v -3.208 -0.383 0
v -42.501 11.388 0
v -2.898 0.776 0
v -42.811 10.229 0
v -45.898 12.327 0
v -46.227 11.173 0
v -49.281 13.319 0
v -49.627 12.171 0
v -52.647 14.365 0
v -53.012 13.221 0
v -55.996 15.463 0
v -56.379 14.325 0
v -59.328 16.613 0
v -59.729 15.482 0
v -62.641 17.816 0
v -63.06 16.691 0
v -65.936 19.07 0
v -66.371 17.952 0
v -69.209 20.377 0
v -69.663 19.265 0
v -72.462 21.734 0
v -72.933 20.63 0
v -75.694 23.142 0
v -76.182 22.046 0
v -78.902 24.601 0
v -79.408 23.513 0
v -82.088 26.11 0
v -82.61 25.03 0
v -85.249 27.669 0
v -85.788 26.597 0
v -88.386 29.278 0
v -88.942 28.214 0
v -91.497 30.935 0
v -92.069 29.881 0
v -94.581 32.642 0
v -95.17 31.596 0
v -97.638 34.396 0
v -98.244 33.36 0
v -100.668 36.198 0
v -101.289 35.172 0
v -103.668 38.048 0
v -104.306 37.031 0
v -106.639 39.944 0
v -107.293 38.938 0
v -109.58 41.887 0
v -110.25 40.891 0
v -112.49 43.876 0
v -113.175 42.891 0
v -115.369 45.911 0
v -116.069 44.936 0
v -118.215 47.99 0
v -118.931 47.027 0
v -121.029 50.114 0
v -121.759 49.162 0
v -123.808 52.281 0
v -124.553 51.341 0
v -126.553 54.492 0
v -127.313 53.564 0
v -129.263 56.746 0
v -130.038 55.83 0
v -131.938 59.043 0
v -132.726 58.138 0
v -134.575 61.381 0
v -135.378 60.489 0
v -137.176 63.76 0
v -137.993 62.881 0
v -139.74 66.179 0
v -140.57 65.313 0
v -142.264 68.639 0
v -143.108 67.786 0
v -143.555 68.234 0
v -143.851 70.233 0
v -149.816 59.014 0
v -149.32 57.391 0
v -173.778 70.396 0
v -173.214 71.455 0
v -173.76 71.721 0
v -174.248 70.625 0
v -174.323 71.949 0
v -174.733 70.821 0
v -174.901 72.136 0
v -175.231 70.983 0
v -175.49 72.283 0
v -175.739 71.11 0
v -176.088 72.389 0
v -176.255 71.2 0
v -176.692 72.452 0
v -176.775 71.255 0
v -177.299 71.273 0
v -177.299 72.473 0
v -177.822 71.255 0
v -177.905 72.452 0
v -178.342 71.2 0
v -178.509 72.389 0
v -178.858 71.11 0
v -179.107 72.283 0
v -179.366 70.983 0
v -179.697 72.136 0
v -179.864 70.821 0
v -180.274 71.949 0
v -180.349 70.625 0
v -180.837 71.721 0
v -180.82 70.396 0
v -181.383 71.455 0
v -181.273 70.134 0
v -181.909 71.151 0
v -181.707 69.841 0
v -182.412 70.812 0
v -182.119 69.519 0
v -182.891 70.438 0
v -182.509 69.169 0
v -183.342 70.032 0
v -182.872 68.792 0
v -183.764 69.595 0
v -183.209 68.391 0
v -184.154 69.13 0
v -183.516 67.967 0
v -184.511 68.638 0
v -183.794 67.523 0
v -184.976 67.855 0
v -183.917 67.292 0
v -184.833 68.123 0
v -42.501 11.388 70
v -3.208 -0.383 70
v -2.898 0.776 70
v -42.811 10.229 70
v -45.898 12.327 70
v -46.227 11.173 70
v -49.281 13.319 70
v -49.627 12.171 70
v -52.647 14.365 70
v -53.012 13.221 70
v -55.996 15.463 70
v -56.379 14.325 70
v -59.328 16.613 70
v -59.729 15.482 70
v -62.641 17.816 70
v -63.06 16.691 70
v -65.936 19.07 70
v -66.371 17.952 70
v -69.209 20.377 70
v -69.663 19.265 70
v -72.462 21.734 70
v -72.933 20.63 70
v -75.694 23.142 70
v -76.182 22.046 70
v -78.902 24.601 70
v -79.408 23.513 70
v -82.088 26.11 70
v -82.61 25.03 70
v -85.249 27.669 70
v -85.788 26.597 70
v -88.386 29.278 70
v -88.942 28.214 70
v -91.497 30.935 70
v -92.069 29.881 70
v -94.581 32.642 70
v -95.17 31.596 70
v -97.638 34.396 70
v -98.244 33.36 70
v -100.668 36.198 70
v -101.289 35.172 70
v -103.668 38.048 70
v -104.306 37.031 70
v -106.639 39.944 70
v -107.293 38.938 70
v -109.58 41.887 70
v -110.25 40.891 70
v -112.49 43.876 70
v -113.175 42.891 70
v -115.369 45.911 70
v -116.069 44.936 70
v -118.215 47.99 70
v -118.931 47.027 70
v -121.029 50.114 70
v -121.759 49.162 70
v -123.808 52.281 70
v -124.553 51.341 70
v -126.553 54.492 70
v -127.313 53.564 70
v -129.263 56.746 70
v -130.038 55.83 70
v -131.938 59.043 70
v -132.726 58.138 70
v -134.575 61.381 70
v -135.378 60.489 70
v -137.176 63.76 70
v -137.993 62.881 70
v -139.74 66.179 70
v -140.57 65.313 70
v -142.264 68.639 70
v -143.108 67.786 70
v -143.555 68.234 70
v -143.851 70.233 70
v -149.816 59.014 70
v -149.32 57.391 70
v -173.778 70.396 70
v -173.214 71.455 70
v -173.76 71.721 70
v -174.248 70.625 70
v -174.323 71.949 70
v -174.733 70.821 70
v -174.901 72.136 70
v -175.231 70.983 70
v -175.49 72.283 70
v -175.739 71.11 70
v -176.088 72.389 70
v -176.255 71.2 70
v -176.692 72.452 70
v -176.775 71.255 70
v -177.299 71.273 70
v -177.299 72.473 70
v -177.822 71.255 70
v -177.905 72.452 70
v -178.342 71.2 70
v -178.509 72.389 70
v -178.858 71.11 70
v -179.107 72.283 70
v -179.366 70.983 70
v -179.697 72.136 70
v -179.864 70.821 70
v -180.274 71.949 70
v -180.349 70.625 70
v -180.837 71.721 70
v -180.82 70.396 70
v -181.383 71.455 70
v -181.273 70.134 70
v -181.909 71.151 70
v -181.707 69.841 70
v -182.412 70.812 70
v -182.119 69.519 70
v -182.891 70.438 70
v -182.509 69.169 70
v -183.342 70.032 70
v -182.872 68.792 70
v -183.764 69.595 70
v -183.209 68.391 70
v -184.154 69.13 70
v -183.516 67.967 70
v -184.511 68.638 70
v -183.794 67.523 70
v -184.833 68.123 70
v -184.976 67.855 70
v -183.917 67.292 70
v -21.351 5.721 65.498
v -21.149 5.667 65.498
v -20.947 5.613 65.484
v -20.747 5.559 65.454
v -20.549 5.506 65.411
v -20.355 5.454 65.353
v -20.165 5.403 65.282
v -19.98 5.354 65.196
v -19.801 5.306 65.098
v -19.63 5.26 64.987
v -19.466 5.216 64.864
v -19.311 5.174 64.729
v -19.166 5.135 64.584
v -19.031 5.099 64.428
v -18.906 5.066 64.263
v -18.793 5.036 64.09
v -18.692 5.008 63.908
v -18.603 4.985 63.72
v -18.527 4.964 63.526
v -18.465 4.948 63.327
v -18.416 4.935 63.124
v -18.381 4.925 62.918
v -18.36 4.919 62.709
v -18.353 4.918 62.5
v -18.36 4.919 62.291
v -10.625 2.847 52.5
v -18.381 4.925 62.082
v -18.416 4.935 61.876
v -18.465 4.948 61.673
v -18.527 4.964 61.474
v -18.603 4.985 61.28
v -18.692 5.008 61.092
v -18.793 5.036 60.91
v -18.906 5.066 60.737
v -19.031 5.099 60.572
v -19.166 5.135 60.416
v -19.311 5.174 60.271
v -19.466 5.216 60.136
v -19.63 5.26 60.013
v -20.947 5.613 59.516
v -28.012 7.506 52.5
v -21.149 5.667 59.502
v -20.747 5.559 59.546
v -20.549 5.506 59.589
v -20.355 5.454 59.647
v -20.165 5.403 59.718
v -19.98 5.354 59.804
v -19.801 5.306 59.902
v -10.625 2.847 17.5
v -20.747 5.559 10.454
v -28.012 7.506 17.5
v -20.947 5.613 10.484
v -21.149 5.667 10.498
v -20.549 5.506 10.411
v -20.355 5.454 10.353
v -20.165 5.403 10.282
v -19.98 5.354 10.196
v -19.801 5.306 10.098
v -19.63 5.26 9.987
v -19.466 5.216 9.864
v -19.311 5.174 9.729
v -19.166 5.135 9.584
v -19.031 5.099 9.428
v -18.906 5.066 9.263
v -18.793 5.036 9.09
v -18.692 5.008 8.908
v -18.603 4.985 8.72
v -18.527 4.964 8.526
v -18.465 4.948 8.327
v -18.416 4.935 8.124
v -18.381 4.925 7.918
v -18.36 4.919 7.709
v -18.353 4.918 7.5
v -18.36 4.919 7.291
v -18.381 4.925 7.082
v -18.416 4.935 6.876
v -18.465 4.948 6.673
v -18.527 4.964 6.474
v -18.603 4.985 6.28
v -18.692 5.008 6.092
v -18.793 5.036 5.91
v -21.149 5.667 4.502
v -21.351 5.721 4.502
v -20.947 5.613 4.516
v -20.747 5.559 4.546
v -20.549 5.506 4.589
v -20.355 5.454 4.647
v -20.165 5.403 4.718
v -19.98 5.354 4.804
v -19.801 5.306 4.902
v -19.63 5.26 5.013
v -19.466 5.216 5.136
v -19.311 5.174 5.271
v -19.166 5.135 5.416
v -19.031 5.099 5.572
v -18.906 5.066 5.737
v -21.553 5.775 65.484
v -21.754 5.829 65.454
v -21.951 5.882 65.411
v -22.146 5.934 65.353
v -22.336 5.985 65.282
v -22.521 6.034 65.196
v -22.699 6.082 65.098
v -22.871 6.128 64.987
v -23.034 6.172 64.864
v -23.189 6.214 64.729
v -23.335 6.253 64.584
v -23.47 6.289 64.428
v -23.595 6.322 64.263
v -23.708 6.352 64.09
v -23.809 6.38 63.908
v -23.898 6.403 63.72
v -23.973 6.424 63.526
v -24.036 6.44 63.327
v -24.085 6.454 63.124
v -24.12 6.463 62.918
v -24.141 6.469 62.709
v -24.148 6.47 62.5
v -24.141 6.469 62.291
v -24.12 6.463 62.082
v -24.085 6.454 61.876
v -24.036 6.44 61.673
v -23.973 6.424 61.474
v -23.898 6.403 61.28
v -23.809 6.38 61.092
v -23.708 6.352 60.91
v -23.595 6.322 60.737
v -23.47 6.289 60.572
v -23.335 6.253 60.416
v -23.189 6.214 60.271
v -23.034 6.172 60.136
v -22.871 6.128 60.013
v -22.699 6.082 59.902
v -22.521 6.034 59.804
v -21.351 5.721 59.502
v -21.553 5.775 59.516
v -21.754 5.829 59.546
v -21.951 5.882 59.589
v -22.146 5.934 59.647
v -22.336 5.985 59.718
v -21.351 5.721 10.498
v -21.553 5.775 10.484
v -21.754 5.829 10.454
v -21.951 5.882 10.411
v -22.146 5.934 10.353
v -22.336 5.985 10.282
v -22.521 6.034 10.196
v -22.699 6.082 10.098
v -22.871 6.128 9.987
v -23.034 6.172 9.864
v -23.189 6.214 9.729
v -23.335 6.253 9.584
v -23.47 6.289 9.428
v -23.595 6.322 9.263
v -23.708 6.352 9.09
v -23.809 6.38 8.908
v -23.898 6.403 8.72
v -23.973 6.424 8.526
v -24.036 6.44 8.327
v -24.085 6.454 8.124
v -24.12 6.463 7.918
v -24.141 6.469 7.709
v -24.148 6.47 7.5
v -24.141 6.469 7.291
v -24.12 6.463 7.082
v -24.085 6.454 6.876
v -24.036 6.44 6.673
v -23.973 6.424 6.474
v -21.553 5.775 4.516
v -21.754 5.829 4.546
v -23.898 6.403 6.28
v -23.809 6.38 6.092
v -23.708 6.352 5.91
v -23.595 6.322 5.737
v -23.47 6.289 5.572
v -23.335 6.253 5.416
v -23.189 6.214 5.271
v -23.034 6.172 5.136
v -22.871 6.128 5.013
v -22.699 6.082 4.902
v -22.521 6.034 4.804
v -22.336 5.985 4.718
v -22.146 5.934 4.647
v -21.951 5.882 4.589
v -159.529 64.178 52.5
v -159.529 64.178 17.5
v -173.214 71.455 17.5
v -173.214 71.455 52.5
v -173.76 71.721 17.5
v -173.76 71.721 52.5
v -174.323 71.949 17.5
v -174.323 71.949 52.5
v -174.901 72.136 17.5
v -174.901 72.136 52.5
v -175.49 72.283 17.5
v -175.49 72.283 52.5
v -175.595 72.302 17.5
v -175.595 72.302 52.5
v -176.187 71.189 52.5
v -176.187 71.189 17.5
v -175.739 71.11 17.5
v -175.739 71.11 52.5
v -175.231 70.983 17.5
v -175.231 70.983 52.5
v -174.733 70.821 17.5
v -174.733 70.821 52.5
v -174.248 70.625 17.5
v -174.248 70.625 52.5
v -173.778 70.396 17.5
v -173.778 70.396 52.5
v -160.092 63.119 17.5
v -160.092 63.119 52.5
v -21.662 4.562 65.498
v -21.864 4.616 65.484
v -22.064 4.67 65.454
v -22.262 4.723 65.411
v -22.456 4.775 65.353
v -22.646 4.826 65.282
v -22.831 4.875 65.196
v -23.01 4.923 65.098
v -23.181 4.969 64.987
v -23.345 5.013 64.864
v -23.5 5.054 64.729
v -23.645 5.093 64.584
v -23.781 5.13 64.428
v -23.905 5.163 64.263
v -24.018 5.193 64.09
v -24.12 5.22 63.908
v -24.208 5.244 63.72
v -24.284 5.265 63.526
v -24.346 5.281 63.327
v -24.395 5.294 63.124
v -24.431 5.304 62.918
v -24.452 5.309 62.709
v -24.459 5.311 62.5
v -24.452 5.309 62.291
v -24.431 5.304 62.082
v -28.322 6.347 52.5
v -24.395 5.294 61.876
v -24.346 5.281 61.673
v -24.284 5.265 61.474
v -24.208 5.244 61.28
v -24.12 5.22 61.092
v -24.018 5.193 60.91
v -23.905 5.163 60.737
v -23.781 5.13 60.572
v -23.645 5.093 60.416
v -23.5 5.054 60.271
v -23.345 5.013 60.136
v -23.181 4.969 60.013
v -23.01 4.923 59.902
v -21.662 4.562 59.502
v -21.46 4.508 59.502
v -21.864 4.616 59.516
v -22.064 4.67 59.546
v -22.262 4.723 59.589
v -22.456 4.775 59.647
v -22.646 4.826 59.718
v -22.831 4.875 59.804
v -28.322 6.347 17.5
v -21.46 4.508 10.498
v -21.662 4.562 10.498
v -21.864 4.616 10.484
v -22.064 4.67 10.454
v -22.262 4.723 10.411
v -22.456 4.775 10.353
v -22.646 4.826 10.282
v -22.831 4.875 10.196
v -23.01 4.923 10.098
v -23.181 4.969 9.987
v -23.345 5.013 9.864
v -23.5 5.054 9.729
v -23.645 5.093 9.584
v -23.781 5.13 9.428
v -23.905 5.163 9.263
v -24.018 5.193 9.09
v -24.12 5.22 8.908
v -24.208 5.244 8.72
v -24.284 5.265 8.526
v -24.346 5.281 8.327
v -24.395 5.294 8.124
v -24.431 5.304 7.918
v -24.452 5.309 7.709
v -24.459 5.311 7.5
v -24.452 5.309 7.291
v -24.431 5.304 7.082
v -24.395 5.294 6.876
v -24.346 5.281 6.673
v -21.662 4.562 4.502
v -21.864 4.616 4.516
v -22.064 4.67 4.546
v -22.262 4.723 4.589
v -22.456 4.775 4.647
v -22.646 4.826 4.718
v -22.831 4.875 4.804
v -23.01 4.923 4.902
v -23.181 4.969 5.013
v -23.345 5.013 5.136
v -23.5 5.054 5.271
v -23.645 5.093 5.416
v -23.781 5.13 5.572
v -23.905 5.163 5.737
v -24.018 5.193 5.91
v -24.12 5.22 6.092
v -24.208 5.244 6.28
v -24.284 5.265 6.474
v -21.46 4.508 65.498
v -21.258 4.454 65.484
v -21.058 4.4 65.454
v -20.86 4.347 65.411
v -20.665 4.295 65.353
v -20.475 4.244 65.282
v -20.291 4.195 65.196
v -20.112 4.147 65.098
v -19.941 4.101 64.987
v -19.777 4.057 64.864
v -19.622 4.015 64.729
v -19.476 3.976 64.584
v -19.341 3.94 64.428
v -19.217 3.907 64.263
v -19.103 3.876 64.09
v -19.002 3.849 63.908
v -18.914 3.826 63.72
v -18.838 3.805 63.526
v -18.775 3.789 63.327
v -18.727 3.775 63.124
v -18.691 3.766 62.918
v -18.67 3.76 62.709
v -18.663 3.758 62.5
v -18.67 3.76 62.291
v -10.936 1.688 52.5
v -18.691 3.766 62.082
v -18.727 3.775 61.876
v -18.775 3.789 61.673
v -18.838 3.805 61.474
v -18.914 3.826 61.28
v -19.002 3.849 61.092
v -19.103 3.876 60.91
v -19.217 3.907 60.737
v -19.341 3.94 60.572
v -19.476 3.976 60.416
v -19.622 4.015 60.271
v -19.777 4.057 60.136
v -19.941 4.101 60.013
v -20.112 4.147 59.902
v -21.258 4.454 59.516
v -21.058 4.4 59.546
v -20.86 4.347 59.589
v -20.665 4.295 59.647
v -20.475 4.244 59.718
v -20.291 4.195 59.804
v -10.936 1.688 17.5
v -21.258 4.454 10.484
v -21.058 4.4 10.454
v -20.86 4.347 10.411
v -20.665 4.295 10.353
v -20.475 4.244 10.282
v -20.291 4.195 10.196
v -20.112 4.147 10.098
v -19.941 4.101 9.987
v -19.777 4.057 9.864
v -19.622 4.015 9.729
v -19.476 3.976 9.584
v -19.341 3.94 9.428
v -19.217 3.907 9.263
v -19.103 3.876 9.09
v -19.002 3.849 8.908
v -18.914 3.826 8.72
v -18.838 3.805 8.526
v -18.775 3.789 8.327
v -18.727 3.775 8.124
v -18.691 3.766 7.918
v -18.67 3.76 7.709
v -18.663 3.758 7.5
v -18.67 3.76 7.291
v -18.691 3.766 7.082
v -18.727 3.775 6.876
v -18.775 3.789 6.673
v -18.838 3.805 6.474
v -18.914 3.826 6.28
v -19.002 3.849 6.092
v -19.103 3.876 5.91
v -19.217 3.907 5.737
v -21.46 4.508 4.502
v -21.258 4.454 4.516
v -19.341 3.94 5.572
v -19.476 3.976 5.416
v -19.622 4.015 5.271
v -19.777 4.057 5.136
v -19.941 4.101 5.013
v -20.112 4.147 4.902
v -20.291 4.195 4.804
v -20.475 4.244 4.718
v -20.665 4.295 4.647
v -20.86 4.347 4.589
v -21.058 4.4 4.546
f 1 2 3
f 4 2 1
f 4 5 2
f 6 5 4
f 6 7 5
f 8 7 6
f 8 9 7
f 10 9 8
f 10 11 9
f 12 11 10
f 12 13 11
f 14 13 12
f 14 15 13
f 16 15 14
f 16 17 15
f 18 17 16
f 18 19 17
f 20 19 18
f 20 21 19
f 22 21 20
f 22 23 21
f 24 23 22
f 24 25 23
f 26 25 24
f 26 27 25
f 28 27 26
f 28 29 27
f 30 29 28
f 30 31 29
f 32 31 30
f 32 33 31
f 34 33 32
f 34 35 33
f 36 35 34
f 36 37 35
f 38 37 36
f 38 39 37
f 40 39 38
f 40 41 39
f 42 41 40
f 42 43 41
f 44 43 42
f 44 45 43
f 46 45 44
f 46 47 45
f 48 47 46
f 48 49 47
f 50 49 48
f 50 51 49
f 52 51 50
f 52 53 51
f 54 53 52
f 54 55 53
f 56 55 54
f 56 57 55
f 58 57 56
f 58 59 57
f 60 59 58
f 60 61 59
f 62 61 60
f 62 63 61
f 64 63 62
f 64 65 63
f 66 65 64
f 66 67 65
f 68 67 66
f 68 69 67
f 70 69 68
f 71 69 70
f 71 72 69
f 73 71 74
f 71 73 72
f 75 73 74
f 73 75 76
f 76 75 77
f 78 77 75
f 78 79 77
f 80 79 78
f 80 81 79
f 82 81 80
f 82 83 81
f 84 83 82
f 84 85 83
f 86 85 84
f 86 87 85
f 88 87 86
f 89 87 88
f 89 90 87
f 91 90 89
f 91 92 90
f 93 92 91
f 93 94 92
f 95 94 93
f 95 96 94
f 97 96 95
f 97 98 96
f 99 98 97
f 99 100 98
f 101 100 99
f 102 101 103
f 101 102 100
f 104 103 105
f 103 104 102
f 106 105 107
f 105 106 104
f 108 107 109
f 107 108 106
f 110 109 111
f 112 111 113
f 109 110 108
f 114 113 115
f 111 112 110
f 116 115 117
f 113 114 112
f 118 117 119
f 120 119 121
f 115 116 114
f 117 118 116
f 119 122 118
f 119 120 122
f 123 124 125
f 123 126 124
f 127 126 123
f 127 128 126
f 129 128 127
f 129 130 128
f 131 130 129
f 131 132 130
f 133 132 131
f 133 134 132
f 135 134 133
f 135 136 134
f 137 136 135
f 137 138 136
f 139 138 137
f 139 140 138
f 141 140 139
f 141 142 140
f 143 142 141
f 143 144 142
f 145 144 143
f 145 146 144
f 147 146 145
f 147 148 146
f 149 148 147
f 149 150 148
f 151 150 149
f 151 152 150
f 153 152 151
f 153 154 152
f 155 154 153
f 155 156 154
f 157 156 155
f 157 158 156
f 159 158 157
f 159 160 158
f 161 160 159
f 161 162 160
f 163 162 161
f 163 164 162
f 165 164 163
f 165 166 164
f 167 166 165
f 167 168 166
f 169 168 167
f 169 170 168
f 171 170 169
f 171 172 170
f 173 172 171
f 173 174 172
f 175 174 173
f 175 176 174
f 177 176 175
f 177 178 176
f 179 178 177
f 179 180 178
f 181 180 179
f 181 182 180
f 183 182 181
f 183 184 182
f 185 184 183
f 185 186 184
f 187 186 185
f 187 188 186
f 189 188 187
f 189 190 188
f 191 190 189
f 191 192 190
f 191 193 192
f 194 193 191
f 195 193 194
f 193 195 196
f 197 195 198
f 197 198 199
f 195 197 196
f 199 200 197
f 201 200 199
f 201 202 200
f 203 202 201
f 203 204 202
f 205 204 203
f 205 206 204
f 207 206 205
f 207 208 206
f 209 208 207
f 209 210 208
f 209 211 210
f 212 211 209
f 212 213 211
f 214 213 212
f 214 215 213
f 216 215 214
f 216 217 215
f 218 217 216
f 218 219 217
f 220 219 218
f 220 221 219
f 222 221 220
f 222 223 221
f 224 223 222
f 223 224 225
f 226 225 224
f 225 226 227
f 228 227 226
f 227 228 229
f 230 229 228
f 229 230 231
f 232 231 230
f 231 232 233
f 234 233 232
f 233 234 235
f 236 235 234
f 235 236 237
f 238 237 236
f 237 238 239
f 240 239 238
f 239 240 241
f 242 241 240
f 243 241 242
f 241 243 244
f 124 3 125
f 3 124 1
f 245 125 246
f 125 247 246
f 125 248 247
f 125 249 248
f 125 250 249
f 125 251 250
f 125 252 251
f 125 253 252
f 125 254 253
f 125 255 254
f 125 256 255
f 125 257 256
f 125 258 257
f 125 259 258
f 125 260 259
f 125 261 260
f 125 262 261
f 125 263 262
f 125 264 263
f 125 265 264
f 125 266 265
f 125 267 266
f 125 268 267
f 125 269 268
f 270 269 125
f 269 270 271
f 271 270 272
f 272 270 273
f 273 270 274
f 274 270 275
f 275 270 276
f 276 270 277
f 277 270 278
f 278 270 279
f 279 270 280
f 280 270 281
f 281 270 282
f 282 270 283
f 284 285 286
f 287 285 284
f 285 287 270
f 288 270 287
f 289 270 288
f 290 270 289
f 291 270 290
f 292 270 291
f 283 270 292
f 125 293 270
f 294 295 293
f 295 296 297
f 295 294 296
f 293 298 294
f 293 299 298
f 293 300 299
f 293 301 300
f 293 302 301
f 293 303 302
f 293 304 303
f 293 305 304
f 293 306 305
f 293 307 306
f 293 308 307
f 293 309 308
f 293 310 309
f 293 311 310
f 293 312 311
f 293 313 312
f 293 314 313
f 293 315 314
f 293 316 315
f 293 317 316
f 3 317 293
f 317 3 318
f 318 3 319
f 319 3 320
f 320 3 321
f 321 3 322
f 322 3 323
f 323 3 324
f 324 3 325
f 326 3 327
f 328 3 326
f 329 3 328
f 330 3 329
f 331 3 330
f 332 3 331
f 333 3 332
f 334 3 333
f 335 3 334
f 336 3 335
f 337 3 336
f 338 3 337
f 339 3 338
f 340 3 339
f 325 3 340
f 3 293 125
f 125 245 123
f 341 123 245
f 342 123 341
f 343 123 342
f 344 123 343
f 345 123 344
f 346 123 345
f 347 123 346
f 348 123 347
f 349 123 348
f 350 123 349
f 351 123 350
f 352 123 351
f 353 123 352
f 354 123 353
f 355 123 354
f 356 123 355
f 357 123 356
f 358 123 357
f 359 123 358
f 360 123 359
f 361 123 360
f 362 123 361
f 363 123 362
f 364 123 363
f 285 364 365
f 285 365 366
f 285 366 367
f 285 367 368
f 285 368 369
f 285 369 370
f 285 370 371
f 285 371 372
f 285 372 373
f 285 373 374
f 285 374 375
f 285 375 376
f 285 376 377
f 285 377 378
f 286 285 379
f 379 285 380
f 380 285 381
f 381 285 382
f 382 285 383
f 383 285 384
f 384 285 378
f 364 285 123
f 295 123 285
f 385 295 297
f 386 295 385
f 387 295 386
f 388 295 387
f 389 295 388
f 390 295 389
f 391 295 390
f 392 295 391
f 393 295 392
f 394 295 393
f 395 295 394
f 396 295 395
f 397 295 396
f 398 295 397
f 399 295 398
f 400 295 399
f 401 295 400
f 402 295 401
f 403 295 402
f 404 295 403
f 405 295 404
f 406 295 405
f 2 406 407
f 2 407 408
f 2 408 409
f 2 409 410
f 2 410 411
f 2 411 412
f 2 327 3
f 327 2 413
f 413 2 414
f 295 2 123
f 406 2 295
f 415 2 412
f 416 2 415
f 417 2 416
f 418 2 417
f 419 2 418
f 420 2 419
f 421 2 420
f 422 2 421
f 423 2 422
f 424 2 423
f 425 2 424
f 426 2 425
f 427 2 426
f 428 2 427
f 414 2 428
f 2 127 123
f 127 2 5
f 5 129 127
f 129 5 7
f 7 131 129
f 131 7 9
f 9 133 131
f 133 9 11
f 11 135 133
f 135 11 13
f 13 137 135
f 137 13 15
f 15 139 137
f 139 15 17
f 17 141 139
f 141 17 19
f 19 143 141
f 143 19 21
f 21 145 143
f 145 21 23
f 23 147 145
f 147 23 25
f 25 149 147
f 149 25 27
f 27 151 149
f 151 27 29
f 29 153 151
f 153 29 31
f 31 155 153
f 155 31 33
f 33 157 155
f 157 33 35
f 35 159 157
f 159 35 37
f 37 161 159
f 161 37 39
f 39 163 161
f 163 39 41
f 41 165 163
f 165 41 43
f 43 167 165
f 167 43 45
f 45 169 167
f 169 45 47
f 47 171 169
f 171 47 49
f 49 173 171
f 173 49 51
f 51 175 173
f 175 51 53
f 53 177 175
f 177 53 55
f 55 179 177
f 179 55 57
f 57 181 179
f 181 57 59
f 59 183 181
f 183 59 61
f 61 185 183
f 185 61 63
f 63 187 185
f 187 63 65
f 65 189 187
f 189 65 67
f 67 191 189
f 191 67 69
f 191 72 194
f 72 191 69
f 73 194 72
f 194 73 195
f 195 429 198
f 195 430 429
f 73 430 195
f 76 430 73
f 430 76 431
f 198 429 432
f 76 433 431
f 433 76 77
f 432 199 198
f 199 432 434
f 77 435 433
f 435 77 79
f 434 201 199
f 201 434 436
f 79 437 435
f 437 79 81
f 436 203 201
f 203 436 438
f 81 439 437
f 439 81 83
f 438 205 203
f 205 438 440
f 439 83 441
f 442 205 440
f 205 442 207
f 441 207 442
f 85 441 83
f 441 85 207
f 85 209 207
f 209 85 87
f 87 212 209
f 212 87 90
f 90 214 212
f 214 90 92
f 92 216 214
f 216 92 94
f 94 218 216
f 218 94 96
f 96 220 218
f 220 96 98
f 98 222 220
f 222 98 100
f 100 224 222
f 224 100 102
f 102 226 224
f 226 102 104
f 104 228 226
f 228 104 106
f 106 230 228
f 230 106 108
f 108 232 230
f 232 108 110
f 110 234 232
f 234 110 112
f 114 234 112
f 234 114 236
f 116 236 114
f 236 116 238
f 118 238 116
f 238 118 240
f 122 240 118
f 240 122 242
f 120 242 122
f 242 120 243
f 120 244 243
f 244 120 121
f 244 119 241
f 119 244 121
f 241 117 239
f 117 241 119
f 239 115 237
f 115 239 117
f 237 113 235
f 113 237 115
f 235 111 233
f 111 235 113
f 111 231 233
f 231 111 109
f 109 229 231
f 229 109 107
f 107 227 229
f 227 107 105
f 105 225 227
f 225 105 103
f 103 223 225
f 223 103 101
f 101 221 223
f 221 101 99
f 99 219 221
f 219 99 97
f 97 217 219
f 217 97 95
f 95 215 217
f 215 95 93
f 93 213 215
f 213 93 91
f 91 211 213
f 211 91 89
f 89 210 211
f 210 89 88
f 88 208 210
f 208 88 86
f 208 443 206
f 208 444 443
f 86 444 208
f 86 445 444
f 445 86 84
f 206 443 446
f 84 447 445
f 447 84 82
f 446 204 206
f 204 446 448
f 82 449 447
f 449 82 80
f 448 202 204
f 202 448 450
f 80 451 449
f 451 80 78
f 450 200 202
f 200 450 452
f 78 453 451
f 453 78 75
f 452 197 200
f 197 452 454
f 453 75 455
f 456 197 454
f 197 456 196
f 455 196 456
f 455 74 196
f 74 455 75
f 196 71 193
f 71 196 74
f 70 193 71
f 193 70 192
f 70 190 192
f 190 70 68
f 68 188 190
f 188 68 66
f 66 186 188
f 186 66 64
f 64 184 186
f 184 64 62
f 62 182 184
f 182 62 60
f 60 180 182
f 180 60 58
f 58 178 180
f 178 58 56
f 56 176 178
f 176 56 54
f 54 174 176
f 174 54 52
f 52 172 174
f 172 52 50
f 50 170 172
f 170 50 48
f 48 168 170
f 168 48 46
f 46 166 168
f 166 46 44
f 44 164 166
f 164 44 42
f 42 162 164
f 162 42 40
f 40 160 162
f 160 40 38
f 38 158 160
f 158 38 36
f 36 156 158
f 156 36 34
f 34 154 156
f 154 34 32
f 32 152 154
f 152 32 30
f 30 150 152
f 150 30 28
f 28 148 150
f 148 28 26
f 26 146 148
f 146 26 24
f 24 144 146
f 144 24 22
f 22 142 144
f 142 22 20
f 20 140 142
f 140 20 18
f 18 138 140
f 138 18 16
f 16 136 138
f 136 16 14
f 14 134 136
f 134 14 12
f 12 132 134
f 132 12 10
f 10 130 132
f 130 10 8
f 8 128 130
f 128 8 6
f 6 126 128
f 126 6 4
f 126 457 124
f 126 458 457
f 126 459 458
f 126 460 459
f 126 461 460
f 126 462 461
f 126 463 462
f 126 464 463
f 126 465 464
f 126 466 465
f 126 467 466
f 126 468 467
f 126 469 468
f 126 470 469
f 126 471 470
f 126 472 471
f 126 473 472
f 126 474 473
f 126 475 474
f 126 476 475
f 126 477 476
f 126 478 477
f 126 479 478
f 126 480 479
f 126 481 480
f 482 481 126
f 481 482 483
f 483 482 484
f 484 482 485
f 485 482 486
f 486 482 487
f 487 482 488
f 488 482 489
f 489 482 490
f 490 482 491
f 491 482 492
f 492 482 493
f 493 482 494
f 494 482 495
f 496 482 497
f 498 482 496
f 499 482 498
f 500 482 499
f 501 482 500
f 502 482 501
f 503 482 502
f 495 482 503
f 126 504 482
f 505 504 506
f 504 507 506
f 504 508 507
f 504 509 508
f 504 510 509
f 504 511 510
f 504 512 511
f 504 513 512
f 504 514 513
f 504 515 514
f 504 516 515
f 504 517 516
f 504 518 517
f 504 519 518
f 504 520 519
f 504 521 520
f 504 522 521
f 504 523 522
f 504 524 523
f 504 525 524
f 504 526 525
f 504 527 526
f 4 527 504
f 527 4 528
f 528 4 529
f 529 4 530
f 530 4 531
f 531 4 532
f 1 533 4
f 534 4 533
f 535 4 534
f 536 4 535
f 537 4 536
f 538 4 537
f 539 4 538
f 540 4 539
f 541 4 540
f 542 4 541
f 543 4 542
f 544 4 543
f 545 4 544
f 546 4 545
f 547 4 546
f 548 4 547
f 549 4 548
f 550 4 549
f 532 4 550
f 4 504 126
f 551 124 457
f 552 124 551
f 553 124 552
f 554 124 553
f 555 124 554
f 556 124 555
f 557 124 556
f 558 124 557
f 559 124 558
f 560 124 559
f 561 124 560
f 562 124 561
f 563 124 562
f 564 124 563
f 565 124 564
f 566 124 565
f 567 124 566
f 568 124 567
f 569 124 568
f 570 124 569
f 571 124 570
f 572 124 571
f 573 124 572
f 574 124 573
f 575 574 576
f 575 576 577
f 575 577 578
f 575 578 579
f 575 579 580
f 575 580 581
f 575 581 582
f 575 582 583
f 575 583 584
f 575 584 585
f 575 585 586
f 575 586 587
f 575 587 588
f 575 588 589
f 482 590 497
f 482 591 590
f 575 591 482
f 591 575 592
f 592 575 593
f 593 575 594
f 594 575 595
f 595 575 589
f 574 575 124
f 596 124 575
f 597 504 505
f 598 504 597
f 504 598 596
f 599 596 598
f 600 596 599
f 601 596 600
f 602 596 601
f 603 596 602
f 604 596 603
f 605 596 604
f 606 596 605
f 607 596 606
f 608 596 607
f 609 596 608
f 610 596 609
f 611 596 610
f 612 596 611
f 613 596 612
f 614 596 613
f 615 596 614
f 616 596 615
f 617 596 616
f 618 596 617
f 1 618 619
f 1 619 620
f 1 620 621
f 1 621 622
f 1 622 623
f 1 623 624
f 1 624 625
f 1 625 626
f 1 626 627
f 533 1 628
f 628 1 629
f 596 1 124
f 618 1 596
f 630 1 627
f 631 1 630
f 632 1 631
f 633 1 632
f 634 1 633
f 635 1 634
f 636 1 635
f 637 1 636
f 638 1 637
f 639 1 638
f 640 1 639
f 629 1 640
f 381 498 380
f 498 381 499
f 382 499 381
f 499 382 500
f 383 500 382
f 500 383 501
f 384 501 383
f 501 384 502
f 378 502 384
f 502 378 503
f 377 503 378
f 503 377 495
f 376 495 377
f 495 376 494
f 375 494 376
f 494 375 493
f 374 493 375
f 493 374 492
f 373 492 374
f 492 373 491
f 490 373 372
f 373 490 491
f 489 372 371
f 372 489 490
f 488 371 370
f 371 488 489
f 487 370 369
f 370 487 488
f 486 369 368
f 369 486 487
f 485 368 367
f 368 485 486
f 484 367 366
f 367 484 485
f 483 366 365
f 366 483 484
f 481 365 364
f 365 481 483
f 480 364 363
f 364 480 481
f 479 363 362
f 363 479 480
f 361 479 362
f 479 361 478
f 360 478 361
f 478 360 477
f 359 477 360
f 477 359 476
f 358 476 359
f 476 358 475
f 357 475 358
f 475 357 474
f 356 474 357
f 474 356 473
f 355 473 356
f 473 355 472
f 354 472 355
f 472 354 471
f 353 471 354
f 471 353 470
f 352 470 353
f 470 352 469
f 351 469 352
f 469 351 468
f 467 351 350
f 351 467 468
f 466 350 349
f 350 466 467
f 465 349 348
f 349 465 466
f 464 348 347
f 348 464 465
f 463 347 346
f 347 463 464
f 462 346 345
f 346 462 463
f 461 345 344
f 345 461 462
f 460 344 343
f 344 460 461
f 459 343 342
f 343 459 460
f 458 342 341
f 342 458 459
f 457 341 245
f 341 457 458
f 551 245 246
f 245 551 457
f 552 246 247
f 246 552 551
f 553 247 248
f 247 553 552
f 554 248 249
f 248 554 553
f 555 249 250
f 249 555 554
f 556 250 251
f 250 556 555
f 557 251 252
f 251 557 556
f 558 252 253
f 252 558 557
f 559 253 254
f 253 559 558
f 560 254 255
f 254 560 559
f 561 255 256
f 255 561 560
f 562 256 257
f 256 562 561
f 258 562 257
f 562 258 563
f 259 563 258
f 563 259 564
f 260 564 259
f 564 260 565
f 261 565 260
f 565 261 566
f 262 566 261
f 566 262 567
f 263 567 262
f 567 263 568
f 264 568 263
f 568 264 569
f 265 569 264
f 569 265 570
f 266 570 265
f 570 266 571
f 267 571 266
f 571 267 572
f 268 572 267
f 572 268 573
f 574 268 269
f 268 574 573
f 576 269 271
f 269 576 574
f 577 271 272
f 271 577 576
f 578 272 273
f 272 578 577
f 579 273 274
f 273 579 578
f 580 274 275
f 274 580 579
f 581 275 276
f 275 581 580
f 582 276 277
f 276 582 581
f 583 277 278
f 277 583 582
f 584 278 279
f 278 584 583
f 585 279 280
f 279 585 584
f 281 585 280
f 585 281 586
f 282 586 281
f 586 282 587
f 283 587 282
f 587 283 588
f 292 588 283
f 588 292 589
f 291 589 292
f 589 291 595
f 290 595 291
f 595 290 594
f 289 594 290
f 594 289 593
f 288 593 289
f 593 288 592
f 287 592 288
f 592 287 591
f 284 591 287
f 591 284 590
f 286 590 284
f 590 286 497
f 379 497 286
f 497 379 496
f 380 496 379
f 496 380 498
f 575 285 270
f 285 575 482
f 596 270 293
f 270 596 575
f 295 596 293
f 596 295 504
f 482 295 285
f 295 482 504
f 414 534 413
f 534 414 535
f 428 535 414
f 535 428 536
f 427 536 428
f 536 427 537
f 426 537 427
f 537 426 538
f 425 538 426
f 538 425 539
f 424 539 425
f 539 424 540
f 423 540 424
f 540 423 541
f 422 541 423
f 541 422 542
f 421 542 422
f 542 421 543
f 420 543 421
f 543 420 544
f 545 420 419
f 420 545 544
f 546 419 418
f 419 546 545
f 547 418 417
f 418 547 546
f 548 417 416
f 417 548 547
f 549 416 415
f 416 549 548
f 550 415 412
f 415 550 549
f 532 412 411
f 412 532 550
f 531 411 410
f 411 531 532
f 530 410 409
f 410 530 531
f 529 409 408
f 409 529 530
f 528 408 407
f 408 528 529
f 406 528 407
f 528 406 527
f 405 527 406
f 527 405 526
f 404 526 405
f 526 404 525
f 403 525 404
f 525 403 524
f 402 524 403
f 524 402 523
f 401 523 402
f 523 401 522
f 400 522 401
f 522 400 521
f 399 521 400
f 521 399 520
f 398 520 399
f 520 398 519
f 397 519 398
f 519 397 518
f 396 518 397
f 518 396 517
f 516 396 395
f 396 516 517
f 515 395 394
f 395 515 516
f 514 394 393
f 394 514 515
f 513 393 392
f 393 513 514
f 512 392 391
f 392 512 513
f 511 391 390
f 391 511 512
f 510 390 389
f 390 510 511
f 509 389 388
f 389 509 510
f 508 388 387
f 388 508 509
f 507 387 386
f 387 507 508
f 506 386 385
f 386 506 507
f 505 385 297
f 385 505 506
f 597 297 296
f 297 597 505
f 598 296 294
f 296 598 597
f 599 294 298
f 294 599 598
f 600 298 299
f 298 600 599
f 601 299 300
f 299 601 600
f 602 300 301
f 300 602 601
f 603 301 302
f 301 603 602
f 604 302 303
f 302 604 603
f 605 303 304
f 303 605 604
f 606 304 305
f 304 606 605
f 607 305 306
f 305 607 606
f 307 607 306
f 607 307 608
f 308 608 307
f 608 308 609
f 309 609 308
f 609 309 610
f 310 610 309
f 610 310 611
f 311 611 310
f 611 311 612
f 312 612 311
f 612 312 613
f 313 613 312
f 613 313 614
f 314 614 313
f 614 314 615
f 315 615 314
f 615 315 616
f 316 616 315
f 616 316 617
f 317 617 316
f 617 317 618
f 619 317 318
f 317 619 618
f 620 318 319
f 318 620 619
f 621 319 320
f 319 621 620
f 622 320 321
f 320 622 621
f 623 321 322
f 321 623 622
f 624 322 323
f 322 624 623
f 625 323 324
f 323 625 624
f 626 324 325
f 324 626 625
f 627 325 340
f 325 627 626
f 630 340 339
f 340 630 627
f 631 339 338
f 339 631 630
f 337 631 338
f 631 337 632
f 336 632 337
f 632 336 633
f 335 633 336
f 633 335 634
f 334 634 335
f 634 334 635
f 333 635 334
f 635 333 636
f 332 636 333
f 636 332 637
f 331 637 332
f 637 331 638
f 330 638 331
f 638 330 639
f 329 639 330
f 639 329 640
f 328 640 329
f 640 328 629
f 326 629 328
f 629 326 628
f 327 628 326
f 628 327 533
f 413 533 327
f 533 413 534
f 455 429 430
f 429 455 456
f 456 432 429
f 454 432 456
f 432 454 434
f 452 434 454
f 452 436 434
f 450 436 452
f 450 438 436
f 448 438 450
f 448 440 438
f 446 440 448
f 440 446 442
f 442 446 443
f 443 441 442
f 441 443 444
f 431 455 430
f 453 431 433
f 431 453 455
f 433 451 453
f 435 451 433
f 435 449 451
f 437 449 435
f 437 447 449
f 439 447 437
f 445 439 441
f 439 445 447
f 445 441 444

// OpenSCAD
// file: ../src/door_catch.scad
in=25.4;

// how thick is the door?
door_thick=44;


// how wide the door is; makes for cleaner angles
door_width=28*in;

// how far should the door be open?
// distance of gap will be echo'd
//open_angle=(sin($t*360)/2+0.5)*45;
open_angle=13;

// distance to edge, used to place hole
catch=15;

// size of catch hole
catch_x=18;
catch_y=35;

// size of screw holes
screw=6;

// space between screws
// screws are assumed to be centered in door_thick
screw_gap=55;

// space around screw holes if automatically calculating height
screw_wall=4;

// thickness of part
wall=1.2;

//height=screw_gap+screw+screw_wall*2;
height=70;

// size of Z shape that stops the door from closing
latch=in/2;

// extra curve at end of the part to make closing smoother
close_r=3;

// trim off ends to fit printer bed 
//trim_base=14;
trim_base=3;
trim_end=10;

// only used for drawing a preview door
door_h=height;
display_angle=open_angle;


$fn=90;

big_fn=400;

function segment_radius(height, chord) = (height/2)+(chord*chord)/(8*height);

// link to sketch
open_y=sin(open_angle)*door_width;
open_x=door_width-(cos(open_angle)*door_width);
opening=sqrt((pow(open_x,2)+pow((open_y-door_thick),2)));
echo(opening/in);
echo(opening);

// link to sketch
latch_x=door_width-(cos(open_angle)*(door_width-latch));
latch_y=(sin(open_angle)*(door_width-latch))-door_thick;
latch_hyp=sqrt(pow(latch_x,2)+pow(latch_y,2));
latch_angle=atan(latch_y/latch_x);
radius=segment_radius(latch_x,latch_y*2);

module door() {
    translate([door_width,0])
    mirror([1,0,0])
    rotate([0,0,display_angle])
    color("tan")
    cube([door_width,door_thick,door_h]);
}

module profile() {
    translate([-wall,trim_base])
    square([wall,door_thick-trim_base]);
    translate([radius,door_thick])
    difference() {
        circle(r=radius+wall,$fn=big_fn);
        circle(r=radius,$fn=big_fn);

        // cut off botttom 
        translate([-radius-wall,-radius-wall*2])
        square([radius*2+wall*2,radius+wall*2]);

        // top right
        square([radius+wall*2,radius+wall*2]);

        // door
        translate([door_width-radius,-door_thick])
        mirror([1,0,0])
        rotate([0,0,display_angle])
        square([door_width,radius]);
    }
    translate([door_width,0])
    rotate([0,0,-open_angle]) 
    translate([-door_width,0]) {
        translate([-wall,-wall])
        square([latch,wall]);
        translate([-wall,-wall])
        square([wall,door_thick+wall-close_r-trim_end]);
        translate([-wall-close_r,door_thick-close_r-trim_end])
        difference() {
            intersection() {
                circle(r=close_r+wall);
                square([close_r+wall,close_r+wall]);
            }
            circle(r=close_r);
        }
    }
}

module dirror_y() {
    children();
    mirror([0,1])
    children();
}

module catch() {
    translate([door_thick/2-catch_x/2-catch,0])
    square([catch_x,catch_y],center=true);
    children();
}

module screws() {
    dirror_y()
    translate([0,screw_gap/2])
    circle(d=screw);
}

module place_catch(angle=0) {
    translate([door_width,0])
    rotate([0,0,-angle])
    translate([-door_width-wall*2,door_thick/2,height/2])
    rotate([90,0,90])
    linear_extrude(height=wall*3)
    children();
}

module latch() {
    difference() {
        linear_extrude(height=height)
        profile();
        place_catch()
        // uncomment this to allow the door to close
        catch()
        screws();
        place_catch(open_angle)
        catch();
    }
}
// main file
include <../src/door_catch.scad>;

close_r=(sin($t*360)/2+0.5)*15;

// RENDER gif
module demo() {
    rotate([0,0,75])
    latch();
}

demo();
